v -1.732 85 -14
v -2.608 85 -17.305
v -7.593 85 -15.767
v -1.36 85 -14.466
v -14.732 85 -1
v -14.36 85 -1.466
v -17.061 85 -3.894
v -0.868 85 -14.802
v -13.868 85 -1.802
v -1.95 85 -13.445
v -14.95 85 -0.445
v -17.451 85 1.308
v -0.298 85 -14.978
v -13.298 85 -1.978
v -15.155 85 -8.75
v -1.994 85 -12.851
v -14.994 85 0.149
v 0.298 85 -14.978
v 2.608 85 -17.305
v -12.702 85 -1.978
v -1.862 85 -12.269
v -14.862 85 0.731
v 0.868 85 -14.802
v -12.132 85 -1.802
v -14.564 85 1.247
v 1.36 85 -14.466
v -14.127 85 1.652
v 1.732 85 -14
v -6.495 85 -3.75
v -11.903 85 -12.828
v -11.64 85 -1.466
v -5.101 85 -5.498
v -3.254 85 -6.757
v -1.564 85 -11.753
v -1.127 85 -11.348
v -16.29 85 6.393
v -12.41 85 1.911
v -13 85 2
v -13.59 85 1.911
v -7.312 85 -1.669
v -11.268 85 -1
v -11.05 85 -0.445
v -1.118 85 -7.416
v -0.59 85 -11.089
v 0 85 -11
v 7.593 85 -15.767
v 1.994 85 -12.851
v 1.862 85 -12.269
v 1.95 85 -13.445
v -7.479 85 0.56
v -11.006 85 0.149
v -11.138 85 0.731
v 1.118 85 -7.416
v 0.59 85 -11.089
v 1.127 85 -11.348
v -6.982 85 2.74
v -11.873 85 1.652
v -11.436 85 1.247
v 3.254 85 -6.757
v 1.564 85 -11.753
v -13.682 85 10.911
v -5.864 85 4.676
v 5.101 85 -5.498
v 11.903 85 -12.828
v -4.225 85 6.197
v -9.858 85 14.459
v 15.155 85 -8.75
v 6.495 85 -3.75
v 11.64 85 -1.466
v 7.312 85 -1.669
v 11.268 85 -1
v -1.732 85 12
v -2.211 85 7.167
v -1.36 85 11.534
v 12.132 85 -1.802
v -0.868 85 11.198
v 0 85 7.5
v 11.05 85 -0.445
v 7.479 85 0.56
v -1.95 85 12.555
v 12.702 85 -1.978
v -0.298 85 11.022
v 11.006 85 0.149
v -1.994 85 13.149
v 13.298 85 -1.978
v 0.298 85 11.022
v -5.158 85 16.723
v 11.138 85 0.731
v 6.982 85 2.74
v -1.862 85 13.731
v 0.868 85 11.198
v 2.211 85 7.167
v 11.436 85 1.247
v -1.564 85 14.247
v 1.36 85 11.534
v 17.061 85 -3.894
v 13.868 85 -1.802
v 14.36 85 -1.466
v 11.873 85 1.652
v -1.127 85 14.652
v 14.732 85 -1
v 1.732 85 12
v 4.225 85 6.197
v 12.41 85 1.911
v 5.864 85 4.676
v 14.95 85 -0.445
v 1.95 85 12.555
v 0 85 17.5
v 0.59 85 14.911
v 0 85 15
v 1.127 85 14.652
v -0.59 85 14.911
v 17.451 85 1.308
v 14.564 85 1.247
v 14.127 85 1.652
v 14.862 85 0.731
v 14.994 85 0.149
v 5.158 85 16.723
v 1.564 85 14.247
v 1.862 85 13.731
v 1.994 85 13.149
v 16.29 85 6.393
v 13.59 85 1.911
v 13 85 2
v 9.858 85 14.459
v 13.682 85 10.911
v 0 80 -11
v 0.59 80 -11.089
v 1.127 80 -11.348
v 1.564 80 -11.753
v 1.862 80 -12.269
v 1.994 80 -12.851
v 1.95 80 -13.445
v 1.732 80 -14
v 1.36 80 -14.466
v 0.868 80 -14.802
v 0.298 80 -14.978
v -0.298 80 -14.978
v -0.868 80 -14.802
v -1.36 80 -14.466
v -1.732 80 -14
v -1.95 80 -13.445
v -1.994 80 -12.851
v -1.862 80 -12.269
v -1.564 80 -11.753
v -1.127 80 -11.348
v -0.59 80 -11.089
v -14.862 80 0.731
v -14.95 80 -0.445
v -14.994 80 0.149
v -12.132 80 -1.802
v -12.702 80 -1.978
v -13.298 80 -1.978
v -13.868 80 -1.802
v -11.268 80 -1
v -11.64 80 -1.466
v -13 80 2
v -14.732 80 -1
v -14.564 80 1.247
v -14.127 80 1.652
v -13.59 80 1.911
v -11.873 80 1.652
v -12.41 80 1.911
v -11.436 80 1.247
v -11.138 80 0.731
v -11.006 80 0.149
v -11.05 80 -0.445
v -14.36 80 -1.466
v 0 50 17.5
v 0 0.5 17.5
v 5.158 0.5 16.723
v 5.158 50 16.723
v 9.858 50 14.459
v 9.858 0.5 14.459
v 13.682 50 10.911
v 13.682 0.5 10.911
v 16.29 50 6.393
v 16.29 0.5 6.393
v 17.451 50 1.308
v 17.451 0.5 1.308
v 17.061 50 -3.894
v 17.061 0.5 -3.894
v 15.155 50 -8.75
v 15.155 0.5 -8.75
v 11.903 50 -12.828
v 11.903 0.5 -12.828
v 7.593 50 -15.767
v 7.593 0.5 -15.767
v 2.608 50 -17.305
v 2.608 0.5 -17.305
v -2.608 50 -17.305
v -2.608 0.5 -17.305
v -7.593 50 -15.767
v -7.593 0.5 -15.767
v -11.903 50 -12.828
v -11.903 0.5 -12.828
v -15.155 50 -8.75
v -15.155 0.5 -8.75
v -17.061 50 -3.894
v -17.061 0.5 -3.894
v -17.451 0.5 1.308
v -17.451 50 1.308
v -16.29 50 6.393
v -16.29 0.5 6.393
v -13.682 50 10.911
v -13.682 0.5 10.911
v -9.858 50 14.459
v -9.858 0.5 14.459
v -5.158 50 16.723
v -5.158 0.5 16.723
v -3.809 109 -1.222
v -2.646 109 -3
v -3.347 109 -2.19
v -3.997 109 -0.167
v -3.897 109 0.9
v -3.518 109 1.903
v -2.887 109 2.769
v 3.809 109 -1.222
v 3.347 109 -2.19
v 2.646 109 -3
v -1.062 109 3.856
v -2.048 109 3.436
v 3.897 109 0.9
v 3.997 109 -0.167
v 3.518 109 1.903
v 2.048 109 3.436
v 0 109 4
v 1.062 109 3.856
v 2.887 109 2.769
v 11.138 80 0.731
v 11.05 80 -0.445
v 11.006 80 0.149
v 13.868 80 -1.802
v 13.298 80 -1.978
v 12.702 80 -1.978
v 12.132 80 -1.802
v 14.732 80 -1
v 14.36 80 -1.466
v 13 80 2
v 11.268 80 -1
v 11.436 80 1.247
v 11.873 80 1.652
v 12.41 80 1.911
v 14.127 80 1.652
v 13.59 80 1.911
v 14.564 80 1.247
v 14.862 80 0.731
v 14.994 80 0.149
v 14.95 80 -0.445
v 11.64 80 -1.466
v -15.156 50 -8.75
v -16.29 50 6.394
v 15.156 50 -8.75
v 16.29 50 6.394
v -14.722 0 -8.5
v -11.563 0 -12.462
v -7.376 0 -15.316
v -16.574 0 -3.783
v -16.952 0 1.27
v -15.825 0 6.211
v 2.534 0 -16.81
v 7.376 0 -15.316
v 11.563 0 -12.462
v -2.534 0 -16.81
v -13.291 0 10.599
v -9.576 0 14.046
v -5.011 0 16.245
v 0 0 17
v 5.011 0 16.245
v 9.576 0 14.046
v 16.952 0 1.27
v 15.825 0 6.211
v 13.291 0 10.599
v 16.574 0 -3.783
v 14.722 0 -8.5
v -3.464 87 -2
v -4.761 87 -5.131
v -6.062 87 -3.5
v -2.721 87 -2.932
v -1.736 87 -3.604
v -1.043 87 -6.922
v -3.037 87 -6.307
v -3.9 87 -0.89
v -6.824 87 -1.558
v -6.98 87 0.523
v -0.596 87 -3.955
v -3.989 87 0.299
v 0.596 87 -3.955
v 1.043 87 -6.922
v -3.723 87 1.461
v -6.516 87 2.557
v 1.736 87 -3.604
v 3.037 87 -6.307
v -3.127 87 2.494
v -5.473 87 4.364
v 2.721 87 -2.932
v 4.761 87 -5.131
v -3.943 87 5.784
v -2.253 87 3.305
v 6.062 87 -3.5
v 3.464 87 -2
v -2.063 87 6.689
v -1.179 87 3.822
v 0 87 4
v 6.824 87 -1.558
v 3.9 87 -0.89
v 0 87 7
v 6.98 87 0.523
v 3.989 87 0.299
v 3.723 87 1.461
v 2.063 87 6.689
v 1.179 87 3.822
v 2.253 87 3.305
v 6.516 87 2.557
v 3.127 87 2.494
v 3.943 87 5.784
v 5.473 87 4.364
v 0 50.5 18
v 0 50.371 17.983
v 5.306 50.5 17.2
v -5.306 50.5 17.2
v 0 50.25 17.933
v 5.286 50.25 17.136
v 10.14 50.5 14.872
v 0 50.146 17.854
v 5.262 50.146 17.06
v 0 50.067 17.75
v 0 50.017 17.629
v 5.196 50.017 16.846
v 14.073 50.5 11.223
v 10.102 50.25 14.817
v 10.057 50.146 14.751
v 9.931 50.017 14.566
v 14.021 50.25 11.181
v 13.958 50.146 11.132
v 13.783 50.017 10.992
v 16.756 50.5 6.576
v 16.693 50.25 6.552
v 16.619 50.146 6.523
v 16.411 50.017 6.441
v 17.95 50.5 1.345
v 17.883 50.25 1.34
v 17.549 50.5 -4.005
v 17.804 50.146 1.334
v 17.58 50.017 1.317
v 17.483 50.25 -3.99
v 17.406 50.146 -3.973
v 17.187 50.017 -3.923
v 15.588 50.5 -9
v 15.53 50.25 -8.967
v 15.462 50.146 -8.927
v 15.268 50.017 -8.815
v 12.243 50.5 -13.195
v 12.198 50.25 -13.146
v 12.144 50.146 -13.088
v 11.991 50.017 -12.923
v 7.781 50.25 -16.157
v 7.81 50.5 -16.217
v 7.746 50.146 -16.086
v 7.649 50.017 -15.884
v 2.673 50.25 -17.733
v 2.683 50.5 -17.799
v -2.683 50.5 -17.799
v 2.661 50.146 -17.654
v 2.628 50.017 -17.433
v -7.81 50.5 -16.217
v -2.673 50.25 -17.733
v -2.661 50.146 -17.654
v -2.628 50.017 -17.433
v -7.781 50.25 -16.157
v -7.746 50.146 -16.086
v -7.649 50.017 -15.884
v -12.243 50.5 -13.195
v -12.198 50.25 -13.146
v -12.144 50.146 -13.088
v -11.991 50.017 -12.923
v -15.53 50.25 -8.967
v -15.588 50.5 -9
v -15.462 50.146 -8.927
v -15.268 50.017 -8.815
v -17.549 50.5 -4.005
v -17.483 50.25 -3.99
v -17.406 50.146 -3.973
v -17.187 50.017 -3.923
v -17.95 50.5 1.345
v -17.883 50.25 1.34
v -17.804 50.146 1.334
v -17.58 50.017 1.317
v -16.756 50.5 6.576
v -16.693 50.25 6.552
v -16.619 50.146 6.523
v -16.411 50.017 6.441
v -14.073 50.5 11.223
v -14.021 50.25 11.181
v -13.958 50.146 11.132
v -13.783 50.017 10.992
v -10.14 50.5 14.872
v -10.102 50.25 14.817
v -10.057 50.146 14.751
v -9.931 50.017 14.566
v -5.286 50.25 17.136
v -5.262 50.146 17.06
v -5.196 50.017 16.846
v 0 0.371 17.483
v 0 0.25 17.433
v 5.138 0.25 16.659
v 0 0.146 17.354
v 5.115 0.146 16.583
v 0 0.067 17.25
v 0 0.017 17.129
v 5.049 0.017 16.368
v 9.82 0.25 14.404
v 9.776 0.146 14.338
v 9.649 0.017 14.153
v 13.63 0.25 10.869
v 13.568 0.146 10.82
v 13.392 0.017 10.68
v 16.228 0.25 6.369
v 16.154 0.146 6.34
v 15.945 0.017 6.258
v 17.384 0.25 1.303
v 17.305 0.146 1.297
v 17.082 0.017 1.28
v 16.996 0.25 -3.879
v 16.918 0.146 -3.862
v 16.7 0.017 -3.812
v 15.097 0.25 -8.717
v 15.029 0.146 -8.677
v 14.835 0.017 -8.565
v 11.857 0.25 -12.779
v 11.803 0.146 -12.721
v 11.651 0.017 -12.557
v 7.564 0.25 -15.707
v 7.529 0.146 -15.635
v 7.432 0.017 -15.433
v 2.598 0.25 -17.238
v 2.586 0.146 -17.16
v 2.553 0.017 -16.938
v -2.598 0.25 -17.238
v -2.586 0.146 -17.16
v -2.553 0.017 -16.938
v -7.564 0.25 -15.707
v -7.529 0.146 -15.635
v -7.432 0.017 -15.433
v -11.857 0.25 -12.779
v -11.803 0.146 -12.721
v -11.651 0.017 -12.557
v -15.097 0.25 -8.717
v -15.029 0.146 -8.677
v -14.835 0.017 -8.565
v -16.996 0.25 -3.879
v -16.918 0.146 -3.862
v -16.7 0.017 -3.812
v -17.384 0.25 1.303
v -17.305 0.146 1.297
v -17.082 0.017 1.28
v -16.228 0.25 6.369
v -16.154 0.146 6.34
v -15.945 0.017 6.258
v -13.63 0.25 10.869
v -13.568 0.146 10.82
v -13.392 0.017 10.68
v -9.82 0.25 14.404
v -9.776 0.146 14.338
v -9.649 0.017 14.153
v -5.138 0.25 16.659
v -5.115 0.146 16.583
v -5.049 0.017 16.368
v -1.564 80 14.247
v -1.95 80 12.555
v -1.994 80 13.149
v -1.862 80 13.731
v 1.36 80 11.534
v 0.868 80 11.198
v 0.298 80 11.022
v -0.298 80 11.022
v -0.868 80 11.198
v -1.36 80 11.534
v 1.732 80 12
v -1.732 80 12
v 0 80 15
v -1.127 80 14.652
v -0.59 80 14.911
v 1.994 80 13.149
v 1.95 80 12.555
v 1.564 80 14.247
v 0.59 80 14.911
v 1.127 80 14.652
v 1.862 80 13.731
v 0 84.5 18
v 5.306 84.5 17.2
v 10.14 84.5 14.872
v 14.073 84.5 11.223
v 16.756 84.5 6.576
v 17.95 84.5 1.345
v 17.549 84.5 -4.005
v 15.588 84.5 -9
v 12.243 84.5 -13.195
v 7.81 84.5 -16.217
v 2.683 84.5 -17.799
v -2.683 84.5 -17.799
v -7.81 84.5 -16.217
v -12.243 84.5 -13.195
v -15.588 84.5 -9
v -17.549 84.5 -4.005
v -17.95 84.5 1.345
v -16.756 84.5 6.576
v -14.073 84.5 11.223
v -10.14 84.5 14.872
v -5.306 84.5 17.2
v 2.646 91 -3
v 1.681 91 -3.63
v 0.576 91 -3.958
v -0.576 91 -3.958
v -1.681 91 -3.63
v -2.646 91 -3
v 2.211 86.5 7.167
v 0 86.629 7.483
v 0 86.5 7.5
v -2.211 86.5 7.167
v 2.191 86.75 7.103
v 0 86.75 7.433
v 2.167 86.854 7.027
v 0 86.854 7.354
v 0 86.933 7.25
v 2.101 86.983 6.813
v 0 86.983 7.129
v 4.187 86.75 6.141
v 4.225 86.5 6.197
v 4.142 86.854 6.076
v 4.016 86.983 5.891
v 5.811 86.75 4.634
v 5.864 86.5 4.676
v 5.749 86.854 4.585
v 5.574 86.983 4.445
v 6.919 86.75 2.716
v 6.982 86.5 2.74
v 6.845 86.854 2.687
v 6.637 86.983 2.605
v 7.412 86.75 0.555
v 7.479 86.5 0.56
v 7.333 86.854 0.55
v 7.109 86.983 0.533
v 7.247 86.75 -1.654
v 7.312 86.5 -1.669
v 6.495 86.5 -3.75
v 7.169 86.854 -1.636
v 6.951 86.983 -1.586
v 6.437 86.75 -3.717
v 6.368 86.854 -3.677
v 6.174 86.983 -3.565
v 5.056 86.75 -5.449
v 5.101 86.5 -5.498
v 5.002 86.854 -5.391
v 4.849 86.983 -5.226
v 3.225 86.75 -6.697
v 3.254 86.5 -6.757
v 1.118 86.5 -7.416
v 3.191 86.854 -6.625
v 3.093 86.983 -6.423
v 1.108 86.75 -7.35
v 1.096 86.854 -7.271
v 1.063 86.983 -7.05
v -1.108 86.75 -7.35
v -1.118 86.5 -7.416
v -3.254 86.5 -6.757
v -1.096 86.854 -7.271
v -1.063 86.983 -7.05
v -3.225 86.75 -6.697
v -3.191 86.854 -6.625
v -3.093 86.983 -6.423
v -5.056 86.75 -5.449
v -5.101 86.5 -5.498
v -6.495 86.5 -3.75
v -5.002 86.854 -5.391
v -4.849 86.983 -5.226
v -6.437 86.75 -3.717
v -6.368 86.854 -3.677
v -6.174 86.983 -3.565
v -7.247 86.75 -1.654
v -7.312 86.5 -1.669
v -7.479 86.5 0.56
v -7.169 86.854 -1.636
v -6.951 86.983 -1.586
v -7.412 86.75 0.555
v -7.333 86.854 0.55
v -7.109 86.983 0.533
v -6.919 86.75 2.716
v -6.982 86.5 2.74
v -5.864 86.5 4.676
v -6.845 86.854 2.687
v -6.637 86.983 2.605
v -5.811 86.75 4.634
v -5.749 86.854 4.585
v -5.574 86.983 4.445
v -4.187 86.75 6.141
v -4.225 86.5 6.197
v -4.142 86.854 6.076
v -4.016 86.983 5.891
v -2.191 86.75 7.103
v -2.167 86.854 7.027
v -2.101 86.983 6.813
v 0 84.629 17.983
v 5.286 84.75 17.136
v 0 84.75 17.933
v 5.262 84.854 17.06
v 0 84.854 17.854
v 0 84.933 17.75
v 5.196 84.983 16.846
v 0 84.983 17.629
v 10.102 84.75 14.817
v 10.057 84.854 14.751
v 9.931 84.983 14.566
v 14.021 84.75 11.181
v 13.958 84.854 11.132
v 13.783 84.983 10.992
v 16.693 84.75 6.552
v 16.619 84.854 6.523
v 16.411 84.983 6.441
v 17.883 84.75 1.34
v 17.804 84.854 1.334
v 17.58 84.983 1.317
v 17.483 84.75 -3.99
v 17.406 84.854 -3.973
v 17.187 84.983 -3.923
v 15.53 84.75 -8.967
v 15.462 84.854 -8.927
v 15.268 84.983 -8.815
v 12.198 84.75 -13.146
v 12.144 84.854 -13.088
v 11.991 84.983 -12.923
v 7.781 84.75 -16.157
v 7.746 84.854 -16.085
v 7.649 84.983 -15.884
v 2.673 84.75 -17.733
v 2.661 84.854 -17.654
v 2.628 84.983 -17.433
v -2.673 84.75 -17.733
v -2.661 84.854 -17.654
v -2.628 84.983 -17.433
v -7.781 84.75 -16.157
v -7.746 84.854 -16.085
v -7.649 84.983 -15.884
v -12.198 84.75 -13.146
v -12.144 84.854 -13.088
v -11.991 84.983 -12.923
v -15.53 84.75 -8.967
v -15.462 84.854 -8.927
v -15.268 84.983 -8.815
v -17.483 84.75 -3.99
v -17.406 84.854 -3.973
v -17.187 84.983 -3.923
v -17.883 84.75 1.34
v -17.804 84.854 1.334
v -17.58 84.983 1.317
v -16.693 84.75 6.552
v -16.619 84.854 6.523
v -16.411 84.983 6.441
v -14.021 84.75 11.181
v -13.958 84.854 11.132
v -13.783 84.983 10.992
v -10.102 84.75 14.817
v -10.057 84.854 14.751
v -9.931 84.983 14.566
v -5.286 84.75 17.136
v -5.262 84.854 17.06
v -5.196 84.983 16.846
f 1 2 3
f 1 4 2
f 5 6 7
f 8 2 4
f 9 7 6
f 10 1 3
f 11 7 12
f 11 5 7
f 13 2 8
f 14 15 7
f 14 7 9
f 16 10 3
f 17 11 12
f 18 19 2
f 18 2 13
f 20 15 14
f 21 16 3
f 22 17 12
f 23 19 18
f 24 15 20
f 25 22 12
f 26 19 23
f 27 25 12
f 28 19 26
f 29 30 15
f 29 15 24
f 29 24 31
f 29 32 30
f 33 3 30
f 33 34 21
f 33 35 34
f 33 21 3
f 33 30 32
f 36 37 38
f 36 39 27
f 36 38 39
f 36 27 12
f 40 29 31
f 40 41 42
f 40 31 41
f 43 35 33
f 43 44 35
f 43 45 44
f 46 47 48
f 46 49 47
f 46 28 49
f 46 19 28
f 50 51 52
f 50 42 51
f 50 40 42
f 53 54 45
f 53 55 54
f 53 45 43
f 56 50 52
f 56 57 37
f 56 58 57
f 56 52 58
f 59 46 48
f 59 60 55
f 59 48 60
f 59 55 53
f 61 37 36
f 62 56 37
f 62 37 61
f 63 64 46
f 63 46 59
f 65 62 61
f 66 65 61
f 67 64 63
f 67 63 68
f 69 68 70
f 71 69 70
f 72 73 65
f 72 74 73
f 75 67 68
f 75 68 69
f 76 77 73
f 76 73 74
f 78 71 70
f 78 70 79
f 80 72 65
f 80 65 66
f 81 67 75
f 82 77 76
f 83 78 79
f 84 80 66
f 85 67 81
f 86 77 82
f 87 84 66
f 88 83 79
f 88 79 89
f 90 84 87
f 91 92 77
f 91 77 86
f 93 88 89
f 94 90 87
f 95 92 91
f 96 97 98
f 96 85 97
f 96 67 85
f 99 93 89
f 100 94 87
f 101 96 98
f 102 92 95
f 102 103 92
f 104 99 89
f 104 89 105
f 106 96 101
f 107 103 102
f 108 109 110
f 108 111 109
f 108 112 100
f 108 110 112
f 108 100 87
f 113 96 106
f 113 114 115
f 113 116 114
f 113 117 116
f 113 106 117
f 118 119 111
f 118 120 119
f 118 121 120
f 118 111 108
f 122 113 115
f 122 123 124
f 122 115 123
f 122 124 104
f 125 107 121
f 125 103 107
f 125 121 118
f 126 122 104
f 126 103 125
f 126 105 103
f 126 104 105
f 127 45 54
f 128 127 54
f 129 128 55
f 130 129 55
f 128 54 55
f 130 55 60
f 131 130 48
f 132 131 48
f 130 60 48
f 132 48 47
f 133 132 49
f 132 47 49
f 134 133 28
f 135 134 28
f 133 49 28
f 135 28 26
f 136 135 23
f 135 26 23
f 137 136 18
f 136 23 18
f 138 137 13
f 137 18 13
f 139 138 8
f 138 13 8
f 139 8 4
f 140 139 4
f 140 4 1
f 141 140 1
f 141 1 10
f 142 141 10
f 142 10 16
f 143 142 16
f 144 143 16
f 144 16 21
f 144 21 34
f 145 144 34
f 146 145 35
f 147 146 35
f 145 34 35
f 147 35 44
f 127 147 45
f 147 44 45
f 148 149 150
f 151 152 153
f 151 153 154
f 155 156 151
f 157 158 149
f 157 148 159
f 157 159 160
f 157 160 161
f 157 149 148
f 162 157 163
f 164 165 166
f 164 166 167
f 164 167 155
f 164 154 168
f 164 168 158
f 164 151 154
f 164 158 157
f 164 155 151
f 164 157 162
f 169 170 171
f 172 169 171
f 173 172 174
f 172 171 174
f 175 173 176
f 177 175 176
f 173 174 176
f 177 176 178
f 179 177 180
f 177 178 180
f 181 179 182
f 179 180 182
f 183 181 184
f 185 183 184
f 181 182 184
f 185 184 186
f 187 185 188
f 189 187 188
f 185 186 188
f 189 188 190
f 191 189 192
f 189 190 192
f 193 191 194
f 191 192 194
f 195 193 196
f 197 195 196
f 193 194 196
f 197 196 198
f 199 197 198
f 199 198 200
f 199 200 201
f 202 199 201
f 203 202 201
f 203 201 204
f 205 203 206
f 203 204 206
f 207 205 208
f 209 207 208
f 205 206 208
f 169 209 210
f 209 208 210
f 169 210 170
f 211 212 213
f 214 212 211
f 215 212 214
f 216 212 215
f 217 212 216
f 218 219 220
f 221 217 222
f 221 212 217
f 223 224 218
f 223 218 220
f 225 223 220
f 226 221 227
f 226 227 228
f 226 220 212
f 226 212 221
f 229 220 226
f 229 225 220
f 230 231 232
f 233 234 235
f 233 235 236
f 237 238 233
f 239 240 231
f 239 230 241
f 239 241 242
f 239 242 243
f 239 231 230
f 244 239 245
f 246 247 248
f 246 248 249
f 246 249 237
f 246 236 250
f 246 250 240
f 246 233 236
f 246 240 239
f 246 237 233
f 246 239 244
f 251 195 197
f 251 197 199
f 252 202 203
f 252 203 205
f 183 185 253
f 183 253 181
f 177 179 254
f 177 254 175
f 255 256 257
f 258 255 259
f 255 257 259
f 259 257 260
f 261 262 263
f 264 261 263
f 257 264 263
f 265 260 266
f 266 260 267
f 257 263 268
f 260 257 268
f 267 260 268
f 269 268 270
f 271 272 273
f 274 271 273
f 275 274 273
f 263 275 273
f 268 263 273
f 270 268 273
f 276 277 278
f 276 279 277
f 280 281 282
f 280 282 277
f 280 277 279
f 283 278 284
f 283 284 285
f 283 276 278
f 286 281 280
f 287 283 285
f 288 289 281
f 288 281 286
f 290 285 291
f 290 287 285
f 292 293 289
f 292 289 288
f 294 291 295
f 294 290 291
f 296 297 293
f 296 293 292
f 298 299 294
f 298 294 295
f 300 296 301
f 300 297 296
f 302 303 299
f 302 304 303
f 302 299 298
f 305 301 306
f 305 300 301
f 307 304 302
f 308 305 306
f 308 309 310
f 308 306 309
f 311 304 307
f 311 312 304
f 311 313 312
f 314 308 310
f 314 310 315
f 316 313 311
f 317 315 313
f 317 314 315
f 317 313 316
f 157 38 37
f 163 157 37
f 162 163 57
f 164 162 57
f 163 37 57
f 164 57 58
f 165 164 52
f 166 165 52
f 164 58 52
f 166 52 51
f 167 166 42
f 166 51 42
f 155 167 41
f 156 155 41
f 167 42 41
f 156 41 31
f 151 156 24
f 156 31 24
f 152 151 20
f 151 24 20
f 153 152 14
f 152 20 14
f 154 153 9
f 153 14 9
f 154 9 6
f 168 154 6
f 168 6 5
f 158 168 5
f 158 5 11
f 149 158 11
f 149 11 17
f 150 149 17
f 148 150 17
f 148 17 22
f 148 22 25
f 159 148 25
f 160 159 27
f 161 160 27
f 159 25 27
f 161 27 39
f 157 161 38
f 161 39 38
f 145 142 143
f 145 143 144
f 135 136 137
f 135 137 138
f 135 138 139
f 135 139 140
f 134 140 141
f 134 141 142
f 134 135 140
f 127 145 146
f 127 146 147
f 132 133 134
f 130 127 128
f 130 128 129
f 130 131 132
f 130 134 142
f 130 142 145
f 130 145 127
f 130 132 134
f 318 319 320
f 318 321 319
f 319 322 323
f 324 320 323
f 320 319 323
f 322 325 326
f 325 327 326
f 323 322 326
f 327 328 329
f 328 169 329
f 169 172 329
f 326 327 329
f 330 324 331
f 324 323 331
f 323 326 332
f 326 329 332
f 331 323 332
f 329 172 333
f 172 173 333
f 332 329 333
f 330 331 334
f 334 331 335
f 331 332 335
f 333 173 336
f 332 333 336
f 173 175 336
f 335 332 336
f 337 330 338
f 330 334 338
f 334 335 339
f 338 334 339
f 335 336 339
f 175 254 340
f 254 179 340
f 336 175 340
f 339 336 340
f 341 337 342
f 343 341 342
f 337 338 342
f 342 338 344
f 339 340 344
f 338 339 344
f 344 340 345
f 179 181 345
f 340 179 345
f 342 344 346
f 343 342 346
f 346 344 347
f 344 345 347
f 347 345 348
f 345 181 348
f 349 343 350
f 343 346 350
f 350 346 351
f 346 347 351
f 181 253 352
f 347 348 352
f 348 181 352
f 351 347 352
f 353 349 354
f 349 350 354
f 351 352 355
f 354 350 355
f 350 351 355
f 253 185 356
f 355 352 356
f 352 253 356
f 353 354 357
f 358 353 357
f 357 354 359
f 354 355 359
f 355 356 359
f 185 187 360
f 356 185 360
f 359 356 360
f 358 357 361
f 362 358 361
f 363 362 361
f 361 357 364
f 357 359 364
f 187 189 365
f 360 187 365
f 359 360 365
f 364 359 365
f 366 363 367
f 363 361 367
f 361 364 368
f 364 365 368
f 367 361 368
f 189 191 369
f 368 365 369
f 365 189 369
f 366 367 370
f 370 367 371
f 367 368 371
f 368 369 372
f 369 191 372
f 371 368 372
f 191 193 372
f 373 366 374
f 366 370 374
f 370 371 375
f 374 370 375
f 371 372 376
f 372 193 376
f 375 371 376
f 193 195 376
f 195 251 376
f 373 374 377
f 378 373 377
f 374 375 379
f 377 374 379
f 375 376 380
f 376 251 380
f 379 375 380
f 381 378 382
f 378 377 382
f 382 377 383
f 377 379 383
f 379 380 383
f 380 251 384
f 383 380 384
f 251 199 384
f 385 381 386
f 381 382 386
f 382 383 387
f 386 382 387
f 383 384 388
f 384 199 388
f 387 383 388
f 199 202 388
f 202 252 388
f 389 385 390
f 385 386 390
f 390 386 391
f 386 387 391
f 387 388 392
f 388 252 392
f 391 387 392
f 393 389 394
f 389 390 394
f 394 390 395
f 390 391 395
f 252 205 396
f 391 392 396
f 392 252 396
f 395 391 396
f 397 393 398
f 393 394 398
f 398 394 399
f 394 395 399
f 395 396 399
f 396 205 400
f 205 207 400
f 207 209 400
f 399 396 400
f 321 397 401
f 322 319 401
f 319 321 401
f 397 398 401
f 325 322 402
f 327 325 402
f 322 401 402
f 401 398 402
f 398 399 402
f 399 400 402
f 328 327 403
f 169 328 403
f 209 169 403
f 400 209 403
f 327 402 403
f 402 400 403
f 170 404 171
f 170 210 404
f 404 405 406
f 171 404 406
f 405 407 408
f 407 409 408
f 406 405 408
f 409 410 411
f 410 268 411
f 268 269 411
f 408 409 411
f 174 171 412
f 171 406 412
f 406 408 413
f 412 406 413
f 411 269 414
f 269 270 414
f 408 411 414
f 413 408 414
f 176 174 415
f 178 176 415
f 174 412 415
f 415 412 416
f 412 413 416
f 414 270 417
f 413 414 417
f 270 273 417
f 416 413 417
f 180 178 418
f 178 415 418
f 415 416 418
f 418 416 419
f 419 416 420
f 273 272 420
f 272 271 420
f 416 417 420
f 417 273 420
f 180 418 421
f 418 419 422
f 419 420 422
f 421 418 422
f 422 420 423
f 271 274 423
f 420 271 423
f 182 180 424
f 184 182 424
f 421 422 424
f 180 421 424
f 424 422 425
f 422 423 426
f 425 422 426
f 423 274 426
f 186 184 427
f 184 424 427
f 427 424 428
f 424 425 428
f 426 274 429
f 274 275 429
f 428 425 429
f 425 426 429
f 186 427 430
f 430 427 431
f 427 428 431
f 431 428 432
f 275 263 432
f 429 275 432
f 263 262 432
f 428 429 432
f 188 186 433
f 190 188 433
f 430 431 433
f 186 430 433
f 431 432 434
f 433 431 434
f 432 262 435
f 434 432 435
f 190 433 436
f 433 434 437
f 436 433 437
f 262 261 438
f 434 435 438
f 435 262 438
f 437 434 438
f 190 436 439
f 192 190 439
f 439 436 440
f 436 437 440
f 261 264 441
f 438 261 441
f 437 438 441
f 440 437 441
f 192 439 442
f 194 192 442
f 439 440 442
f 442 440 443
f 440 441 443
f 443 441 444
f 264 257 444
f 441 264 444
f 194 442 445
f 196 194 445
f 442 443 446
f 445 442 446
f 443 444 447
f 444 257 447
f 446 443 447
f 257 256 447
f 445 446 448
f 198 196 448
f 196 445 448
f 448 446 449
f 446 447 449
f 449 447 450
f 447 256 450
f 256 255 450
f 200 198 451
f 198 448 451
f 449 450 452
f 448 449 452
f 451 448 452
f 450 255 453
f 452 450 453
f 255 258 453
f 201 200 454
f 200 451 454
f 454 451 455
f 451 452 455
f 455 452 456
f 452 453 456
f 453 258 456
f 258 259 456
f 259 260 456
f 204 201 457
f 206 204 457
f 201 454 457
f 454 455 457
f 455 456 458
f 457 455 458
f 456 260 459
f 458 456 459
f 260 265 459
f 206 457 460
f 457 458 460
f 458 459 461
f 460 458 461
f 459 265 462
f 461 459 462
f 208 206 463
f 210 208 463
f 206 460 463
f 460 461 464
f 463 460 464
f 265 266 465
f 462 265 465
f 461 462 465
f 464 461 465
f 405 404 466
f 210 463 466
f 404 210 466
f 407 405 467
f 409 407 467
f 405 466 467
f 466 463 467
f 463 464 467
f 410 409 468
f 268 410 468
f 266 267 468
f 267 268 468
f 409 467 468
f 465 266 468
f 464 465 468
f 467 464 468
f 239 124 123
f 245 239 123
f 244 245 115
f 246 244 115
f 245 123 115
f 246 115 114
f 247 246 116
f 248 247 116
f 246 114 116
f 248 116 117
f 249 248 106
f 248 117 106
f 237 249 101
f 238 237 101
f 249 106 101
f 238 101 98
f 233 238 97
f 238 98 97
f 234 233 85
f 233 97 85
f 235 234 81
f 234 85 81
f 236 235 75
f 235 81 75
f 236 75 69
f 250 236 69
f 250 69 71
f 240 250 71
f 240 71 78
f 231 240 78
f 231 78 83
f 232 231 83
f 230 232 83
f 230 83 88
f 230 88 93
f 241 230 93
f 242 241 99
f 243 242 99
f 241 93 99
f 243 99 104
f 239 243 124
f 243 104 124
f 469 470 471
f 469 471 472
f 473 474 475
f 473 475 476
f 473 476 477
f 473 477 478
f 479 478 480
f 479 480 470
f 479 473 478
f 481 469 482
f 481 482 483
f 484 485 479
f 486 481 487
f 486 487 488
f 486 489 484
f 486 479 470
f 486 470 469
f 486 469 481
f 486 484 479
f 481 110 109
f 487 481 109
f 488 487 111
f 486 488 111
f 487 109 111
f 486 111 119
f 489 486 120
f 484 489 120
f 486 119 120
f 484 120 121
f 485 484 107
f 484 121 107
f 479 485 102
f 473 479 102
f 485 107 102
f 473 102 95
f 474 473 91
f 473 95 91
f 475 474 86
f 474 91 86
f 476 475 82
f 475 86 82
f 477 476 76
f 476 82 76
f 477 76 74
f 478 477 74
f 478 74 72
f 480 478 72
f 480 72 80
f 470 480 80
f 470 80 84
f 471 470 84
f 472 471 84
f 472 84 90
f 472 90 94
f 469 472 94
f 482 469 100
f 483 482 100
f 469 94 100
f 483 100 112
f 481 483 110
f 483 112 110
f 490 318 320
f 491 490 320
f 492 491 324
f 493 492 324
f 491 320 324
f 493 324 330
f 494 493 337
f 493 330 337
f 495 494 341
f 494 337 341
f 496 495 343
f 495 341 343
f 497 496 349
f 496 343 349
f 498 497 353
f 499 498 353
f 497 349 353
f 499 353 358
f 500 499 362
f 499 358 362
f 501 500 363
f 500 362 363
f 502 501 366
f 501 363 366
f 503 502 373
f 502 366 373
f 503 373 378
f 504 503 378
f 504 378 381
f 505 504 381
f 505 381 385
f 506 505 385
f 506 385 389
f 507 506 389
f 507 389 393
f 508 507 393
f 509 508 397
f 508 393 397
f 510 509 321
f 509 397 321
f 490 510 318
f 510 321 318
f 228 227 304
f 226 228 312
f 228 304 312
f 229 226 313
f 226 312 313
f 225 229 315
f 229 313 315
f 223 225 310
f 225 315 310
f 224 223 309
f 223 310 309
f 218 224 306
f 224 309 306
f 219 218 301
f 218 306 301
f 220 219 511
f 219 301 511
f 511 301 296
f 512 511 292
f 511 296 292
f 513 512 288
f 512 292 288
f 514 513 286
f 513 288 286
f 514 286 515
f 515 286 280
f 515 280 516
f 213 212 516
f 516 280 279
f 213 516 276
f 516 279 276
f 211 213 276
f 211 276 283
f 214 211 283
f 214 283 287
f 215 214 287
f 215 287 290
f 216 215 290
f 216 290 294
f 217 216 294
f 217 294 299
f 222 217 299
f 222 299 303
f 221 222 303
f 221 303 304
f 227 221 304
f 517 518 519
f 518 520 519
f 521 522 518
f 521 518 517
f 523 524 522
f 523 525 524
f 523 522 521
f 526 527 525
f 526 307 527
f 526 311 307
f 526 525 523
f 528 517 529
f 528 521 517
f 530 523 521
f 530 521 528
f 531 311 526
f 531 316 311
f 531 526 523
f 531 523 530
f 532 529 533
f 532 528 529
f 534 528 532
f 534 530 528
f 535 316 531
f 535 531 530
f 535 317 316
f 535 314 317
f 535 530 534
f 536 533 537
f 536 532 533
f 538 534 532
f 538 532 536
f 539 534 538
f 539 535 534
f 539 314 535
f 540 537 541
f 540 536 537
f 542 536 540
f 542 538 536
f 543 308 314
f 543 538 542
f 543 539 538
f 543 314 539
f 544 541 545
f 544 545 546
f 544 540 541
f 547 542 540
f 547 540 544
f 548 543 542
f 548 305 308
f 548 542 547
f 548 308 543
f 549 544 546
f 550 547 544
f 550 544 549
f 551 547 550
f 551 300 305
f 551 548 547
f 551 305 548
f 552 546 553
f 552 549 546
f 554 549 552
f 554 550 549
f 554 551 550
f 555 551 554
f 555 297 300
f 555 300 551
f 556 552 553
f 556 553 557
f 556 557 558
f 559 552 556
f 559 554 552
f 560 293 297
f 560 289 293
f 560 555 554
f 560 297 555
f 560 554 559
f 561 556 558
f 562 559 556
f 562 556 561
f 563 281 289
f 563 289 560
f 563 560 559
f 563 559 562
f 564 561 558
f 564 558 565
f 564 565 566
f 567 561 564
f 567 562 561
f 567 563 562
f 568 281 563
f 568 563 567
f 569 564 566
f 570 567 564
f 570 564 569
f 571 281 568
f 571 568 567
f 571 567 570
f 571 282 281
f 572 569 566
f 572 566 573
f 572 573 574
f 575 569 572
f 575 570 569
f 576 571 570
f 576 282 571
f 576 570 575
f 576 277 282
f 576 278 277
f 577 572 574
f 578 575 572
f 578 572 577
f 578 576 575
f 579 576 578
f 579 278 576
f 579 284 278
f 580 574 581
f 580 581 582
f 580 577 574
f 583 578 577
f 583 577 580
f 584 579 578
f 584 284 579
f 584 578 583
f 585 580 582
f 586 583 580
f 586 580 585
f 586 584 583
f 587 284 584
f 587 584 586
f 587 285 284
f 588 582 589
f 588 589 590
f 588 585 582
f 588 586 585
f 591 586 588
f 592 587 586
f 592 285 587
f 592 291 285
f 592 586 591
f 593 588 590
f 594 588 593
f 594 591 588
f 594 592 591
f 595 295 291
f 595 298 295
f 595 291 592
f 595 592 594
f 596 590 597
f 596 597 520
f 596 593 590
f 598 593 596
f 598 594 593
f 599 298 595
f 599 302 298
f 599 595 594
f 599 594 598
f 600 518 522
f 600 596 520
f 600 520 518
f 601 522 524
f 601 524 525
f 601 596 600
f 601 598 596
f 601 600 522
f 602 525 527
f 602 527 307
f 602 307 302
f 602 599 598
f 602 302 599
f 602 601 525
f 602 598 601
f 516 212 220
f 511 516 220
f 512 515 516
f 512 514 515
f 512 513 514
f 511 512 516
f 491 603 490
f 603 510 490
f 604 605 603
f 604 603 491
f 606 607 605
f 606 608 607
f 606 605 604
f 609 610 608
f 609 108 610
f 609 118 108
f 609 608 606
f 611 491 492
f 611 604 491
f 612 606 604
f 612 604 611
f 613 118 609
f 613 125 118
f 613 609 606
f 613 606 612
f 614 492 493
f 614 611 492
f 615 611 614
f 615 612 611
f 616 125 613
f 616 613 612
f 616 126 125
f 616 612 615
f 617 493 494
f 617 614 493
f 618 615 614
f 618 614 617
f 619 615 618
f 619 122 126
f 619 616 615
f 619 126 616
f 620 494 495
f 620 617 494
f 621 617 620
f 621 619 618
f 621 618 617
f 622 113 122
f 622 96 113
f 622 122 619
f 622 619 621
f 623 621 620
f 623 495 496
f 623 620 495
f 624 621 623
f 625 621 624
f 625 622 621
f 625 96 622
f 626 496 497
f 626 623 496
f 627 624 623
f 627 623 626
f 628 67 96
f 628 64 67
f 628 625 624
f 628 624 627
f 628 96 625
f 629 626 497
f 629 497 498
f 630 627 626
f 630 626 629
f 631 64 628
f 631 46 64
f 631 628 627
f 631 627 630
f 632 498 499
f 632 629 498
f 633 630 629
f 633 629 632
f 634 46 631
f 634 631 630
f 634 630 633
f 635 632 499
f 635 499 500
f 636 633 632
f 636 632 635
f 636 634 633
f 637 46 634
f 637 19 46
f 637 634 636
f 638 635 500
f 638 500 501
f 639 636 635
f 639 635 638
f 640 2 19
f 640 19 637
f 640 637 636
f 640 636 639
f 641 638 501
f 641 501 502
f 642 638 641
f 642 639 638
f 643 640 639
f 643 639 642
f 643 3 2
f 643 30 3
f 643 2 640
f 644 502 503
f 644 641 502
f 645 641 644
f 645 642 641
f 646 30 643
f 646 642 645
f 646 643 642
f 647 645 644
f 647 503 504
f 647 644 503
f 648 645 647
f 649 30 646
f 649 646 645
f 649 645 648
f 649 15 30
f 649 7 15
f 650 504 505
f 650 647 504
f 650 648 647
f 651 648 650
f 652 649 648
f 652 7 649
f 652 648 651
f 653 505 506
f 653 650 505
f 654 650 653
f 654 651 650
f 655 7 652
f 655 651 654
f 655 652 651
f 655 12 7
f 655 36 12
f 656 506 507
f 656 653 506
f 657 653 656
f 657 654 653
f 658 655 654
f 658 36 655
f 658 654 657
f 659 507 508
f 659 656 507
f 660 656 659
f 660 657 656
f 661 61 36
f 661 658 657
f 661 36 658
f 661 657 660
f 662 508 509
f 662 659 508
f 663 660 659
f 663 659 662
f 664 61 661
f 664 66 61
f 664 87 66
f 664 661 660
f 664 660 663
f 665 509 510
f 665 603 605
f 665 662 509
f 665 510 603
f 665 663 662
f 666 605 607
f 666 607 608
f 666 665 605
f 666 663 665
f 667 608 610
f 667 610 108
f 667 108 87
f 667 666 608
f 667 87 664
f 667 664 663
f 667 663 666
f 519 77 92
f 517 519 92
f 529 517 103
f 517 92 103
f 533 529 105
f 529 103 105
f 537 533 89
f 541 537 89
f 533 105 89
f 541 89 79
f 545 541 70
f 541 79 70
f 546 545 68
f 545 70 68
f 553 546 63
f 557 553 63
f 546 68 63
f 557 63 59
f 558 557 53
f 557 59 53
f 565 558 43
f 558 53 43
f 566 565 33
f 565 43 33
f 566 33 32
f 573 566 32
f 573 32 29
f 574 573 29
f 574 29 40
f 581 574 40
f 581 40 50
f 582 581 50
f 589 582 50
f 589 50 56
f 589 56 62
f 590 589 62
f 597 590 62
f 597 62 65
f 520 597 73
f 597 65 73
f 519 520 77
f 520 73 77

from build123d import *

# Parameters (mm, degrees)
SKETCH_1_R          = 17.5
EXTRUDE_1_DEPTH     = 50
SKETCH_3_R          = 18
EXTRUDE_4_DEPTH     = 35
SKETCH_4_R          = 7.5
EXTRUDE_5_DEPTH     = 2
SKETCH_5_R          = 4
EXTRUDE_6_DEPTH     = 22
SKETCH_6_R          = 2
CUT_EXTRUDE_1_DEPTH = 5
SKETCH_7_W          = 8.061647896
SKETCH_7_H          = 1.71902786
CUT_EXTRUDE_2_DEPTH = 18
FILLET_10_R         = 0.5
FILLET_11_R         = 0.5
FILLET_12_R         = 0.5
FILLET_13_R         = 0.5


with BuildPart() as part:
    # 草图1 → 凸台-拉伸1 (new body)
    with BuildSketch(Plane(origin=(0, 0, 0), x_dir=(1, 0, 0), z_dir=(0, 1, 0))):
        with Locations(Location((0, 0, 0), (0, 0, 270))):
            Circle(SKETCH_1_R)
    extrude(amount=EXTRUDE_1_DEPTH)

    # 草图3 → 凸台-拉伸4 (add)
    with BuildSketch(Plane(origin=(0, 50, 0), x_dir=(1, 0, 0), z_dir=(0, 1, 0))):
        with Locations(Location((0, 0, 0), (0, 0, 270))):
            Circle(SKETCH_3_R)
    extrude(amount=EXTRUDE_4_DEPTH)

    # 草图4 → 凸台-拉伸5 (add)
    with BuildSketch(Plane(origin=(0, 85, 0), x_dir=(1, 0, 0), z_dir=(0, 1, 0))):
        with Locations(Location((0, 0, 0), (0, 0, 270))):
            Circle(SKETCH_4_R)
    extrude(amount=EXTRUDE_5_DEPTH)

    # 草图5 → 凸台-拉伸6 (add)
    with BuildSketch(Plane(origin=(0, 87, 0), x_dir=(1, 0, 0), z_dir=(0, 1, 0))):
        with Locations(Location((0, 0, 0), (0, 0, 270))):
            Circle(SKETCH_5_R)
    extrude(amount=EXTRUDE_6_DEPTH)

    # 草图6 → 切除-拉伸1 (cut)
    with BuildSketch(Plane(origin=(0, 85, 0), x_dir=(1, 0, 0), z_dir=(0, 1, 0))):
        with Locations(Location((0, 13, 0), (0, 0, 270))):
            Circle(SKETCH_6_R)
        with Locations(Location((13, 0, 0), (0, 0, 270))):
            Circle(SKETCH_6_R)
        with Locations(Location((0, -13, 0), (0, 0, 270))):
            Circle(SKETCH_6_R)
        with Locations(Location((-13, 0, 0), (0, 0, 270))):
            Circle(SKETCH_6_R)
    extrude(amount=-CUT_EXTRUDE_1_DEPTH, mode=Mode.SUBTRACT)

    # 草图7 → 切除-拉伸2 (cut)
    with BuildSketch(Plane(origin=(0, 109, 0), x_dir=(1, 0, 0), z_dir=(0, 1, 0))):
        with Locations((-0.414937759, 3.85951393)):
            Rectangle(SKETCH_7_W, SKETCH_7_H)
    extrude(amount=-CUT_EXTRUDE_2_DEPTH, mode=Mode.SUBTRACT)

    # 圆角10
    fillet_10_edges = [part.edges().sort_by_distance(p)[0] for p in [
        (0, 85, -18),
    ]]
    fillet(fillet_10_edges, radius=FILLET_10_R)

    # 圆角11
    fillet_11_edges = [part.edges().sort_by_distance(p)[0] for p in [
        (0, 50, -18),
    ]]
    fillet(fillet_11_edges, radius=FILLET_11_R - 0.0001)  # a hair under: the kernel refuses the full size

    # 圆角12
    fillet_12_edges = [part.edges().sort_by_distance(p)[0] for p in [
        (0, 0, -17.5),
    ]]
    fillet(fillet_12_edges, radius=FILLET_12_R)

    # 圆角13
    fillet_13_edges = [part.edges().sort_by_distance(p)[0] for p in [
        (0, 87, -7.5),
    ]]
    fillet(fillet_13_edges, radius=FILLET_13_R)


solid = part.part
